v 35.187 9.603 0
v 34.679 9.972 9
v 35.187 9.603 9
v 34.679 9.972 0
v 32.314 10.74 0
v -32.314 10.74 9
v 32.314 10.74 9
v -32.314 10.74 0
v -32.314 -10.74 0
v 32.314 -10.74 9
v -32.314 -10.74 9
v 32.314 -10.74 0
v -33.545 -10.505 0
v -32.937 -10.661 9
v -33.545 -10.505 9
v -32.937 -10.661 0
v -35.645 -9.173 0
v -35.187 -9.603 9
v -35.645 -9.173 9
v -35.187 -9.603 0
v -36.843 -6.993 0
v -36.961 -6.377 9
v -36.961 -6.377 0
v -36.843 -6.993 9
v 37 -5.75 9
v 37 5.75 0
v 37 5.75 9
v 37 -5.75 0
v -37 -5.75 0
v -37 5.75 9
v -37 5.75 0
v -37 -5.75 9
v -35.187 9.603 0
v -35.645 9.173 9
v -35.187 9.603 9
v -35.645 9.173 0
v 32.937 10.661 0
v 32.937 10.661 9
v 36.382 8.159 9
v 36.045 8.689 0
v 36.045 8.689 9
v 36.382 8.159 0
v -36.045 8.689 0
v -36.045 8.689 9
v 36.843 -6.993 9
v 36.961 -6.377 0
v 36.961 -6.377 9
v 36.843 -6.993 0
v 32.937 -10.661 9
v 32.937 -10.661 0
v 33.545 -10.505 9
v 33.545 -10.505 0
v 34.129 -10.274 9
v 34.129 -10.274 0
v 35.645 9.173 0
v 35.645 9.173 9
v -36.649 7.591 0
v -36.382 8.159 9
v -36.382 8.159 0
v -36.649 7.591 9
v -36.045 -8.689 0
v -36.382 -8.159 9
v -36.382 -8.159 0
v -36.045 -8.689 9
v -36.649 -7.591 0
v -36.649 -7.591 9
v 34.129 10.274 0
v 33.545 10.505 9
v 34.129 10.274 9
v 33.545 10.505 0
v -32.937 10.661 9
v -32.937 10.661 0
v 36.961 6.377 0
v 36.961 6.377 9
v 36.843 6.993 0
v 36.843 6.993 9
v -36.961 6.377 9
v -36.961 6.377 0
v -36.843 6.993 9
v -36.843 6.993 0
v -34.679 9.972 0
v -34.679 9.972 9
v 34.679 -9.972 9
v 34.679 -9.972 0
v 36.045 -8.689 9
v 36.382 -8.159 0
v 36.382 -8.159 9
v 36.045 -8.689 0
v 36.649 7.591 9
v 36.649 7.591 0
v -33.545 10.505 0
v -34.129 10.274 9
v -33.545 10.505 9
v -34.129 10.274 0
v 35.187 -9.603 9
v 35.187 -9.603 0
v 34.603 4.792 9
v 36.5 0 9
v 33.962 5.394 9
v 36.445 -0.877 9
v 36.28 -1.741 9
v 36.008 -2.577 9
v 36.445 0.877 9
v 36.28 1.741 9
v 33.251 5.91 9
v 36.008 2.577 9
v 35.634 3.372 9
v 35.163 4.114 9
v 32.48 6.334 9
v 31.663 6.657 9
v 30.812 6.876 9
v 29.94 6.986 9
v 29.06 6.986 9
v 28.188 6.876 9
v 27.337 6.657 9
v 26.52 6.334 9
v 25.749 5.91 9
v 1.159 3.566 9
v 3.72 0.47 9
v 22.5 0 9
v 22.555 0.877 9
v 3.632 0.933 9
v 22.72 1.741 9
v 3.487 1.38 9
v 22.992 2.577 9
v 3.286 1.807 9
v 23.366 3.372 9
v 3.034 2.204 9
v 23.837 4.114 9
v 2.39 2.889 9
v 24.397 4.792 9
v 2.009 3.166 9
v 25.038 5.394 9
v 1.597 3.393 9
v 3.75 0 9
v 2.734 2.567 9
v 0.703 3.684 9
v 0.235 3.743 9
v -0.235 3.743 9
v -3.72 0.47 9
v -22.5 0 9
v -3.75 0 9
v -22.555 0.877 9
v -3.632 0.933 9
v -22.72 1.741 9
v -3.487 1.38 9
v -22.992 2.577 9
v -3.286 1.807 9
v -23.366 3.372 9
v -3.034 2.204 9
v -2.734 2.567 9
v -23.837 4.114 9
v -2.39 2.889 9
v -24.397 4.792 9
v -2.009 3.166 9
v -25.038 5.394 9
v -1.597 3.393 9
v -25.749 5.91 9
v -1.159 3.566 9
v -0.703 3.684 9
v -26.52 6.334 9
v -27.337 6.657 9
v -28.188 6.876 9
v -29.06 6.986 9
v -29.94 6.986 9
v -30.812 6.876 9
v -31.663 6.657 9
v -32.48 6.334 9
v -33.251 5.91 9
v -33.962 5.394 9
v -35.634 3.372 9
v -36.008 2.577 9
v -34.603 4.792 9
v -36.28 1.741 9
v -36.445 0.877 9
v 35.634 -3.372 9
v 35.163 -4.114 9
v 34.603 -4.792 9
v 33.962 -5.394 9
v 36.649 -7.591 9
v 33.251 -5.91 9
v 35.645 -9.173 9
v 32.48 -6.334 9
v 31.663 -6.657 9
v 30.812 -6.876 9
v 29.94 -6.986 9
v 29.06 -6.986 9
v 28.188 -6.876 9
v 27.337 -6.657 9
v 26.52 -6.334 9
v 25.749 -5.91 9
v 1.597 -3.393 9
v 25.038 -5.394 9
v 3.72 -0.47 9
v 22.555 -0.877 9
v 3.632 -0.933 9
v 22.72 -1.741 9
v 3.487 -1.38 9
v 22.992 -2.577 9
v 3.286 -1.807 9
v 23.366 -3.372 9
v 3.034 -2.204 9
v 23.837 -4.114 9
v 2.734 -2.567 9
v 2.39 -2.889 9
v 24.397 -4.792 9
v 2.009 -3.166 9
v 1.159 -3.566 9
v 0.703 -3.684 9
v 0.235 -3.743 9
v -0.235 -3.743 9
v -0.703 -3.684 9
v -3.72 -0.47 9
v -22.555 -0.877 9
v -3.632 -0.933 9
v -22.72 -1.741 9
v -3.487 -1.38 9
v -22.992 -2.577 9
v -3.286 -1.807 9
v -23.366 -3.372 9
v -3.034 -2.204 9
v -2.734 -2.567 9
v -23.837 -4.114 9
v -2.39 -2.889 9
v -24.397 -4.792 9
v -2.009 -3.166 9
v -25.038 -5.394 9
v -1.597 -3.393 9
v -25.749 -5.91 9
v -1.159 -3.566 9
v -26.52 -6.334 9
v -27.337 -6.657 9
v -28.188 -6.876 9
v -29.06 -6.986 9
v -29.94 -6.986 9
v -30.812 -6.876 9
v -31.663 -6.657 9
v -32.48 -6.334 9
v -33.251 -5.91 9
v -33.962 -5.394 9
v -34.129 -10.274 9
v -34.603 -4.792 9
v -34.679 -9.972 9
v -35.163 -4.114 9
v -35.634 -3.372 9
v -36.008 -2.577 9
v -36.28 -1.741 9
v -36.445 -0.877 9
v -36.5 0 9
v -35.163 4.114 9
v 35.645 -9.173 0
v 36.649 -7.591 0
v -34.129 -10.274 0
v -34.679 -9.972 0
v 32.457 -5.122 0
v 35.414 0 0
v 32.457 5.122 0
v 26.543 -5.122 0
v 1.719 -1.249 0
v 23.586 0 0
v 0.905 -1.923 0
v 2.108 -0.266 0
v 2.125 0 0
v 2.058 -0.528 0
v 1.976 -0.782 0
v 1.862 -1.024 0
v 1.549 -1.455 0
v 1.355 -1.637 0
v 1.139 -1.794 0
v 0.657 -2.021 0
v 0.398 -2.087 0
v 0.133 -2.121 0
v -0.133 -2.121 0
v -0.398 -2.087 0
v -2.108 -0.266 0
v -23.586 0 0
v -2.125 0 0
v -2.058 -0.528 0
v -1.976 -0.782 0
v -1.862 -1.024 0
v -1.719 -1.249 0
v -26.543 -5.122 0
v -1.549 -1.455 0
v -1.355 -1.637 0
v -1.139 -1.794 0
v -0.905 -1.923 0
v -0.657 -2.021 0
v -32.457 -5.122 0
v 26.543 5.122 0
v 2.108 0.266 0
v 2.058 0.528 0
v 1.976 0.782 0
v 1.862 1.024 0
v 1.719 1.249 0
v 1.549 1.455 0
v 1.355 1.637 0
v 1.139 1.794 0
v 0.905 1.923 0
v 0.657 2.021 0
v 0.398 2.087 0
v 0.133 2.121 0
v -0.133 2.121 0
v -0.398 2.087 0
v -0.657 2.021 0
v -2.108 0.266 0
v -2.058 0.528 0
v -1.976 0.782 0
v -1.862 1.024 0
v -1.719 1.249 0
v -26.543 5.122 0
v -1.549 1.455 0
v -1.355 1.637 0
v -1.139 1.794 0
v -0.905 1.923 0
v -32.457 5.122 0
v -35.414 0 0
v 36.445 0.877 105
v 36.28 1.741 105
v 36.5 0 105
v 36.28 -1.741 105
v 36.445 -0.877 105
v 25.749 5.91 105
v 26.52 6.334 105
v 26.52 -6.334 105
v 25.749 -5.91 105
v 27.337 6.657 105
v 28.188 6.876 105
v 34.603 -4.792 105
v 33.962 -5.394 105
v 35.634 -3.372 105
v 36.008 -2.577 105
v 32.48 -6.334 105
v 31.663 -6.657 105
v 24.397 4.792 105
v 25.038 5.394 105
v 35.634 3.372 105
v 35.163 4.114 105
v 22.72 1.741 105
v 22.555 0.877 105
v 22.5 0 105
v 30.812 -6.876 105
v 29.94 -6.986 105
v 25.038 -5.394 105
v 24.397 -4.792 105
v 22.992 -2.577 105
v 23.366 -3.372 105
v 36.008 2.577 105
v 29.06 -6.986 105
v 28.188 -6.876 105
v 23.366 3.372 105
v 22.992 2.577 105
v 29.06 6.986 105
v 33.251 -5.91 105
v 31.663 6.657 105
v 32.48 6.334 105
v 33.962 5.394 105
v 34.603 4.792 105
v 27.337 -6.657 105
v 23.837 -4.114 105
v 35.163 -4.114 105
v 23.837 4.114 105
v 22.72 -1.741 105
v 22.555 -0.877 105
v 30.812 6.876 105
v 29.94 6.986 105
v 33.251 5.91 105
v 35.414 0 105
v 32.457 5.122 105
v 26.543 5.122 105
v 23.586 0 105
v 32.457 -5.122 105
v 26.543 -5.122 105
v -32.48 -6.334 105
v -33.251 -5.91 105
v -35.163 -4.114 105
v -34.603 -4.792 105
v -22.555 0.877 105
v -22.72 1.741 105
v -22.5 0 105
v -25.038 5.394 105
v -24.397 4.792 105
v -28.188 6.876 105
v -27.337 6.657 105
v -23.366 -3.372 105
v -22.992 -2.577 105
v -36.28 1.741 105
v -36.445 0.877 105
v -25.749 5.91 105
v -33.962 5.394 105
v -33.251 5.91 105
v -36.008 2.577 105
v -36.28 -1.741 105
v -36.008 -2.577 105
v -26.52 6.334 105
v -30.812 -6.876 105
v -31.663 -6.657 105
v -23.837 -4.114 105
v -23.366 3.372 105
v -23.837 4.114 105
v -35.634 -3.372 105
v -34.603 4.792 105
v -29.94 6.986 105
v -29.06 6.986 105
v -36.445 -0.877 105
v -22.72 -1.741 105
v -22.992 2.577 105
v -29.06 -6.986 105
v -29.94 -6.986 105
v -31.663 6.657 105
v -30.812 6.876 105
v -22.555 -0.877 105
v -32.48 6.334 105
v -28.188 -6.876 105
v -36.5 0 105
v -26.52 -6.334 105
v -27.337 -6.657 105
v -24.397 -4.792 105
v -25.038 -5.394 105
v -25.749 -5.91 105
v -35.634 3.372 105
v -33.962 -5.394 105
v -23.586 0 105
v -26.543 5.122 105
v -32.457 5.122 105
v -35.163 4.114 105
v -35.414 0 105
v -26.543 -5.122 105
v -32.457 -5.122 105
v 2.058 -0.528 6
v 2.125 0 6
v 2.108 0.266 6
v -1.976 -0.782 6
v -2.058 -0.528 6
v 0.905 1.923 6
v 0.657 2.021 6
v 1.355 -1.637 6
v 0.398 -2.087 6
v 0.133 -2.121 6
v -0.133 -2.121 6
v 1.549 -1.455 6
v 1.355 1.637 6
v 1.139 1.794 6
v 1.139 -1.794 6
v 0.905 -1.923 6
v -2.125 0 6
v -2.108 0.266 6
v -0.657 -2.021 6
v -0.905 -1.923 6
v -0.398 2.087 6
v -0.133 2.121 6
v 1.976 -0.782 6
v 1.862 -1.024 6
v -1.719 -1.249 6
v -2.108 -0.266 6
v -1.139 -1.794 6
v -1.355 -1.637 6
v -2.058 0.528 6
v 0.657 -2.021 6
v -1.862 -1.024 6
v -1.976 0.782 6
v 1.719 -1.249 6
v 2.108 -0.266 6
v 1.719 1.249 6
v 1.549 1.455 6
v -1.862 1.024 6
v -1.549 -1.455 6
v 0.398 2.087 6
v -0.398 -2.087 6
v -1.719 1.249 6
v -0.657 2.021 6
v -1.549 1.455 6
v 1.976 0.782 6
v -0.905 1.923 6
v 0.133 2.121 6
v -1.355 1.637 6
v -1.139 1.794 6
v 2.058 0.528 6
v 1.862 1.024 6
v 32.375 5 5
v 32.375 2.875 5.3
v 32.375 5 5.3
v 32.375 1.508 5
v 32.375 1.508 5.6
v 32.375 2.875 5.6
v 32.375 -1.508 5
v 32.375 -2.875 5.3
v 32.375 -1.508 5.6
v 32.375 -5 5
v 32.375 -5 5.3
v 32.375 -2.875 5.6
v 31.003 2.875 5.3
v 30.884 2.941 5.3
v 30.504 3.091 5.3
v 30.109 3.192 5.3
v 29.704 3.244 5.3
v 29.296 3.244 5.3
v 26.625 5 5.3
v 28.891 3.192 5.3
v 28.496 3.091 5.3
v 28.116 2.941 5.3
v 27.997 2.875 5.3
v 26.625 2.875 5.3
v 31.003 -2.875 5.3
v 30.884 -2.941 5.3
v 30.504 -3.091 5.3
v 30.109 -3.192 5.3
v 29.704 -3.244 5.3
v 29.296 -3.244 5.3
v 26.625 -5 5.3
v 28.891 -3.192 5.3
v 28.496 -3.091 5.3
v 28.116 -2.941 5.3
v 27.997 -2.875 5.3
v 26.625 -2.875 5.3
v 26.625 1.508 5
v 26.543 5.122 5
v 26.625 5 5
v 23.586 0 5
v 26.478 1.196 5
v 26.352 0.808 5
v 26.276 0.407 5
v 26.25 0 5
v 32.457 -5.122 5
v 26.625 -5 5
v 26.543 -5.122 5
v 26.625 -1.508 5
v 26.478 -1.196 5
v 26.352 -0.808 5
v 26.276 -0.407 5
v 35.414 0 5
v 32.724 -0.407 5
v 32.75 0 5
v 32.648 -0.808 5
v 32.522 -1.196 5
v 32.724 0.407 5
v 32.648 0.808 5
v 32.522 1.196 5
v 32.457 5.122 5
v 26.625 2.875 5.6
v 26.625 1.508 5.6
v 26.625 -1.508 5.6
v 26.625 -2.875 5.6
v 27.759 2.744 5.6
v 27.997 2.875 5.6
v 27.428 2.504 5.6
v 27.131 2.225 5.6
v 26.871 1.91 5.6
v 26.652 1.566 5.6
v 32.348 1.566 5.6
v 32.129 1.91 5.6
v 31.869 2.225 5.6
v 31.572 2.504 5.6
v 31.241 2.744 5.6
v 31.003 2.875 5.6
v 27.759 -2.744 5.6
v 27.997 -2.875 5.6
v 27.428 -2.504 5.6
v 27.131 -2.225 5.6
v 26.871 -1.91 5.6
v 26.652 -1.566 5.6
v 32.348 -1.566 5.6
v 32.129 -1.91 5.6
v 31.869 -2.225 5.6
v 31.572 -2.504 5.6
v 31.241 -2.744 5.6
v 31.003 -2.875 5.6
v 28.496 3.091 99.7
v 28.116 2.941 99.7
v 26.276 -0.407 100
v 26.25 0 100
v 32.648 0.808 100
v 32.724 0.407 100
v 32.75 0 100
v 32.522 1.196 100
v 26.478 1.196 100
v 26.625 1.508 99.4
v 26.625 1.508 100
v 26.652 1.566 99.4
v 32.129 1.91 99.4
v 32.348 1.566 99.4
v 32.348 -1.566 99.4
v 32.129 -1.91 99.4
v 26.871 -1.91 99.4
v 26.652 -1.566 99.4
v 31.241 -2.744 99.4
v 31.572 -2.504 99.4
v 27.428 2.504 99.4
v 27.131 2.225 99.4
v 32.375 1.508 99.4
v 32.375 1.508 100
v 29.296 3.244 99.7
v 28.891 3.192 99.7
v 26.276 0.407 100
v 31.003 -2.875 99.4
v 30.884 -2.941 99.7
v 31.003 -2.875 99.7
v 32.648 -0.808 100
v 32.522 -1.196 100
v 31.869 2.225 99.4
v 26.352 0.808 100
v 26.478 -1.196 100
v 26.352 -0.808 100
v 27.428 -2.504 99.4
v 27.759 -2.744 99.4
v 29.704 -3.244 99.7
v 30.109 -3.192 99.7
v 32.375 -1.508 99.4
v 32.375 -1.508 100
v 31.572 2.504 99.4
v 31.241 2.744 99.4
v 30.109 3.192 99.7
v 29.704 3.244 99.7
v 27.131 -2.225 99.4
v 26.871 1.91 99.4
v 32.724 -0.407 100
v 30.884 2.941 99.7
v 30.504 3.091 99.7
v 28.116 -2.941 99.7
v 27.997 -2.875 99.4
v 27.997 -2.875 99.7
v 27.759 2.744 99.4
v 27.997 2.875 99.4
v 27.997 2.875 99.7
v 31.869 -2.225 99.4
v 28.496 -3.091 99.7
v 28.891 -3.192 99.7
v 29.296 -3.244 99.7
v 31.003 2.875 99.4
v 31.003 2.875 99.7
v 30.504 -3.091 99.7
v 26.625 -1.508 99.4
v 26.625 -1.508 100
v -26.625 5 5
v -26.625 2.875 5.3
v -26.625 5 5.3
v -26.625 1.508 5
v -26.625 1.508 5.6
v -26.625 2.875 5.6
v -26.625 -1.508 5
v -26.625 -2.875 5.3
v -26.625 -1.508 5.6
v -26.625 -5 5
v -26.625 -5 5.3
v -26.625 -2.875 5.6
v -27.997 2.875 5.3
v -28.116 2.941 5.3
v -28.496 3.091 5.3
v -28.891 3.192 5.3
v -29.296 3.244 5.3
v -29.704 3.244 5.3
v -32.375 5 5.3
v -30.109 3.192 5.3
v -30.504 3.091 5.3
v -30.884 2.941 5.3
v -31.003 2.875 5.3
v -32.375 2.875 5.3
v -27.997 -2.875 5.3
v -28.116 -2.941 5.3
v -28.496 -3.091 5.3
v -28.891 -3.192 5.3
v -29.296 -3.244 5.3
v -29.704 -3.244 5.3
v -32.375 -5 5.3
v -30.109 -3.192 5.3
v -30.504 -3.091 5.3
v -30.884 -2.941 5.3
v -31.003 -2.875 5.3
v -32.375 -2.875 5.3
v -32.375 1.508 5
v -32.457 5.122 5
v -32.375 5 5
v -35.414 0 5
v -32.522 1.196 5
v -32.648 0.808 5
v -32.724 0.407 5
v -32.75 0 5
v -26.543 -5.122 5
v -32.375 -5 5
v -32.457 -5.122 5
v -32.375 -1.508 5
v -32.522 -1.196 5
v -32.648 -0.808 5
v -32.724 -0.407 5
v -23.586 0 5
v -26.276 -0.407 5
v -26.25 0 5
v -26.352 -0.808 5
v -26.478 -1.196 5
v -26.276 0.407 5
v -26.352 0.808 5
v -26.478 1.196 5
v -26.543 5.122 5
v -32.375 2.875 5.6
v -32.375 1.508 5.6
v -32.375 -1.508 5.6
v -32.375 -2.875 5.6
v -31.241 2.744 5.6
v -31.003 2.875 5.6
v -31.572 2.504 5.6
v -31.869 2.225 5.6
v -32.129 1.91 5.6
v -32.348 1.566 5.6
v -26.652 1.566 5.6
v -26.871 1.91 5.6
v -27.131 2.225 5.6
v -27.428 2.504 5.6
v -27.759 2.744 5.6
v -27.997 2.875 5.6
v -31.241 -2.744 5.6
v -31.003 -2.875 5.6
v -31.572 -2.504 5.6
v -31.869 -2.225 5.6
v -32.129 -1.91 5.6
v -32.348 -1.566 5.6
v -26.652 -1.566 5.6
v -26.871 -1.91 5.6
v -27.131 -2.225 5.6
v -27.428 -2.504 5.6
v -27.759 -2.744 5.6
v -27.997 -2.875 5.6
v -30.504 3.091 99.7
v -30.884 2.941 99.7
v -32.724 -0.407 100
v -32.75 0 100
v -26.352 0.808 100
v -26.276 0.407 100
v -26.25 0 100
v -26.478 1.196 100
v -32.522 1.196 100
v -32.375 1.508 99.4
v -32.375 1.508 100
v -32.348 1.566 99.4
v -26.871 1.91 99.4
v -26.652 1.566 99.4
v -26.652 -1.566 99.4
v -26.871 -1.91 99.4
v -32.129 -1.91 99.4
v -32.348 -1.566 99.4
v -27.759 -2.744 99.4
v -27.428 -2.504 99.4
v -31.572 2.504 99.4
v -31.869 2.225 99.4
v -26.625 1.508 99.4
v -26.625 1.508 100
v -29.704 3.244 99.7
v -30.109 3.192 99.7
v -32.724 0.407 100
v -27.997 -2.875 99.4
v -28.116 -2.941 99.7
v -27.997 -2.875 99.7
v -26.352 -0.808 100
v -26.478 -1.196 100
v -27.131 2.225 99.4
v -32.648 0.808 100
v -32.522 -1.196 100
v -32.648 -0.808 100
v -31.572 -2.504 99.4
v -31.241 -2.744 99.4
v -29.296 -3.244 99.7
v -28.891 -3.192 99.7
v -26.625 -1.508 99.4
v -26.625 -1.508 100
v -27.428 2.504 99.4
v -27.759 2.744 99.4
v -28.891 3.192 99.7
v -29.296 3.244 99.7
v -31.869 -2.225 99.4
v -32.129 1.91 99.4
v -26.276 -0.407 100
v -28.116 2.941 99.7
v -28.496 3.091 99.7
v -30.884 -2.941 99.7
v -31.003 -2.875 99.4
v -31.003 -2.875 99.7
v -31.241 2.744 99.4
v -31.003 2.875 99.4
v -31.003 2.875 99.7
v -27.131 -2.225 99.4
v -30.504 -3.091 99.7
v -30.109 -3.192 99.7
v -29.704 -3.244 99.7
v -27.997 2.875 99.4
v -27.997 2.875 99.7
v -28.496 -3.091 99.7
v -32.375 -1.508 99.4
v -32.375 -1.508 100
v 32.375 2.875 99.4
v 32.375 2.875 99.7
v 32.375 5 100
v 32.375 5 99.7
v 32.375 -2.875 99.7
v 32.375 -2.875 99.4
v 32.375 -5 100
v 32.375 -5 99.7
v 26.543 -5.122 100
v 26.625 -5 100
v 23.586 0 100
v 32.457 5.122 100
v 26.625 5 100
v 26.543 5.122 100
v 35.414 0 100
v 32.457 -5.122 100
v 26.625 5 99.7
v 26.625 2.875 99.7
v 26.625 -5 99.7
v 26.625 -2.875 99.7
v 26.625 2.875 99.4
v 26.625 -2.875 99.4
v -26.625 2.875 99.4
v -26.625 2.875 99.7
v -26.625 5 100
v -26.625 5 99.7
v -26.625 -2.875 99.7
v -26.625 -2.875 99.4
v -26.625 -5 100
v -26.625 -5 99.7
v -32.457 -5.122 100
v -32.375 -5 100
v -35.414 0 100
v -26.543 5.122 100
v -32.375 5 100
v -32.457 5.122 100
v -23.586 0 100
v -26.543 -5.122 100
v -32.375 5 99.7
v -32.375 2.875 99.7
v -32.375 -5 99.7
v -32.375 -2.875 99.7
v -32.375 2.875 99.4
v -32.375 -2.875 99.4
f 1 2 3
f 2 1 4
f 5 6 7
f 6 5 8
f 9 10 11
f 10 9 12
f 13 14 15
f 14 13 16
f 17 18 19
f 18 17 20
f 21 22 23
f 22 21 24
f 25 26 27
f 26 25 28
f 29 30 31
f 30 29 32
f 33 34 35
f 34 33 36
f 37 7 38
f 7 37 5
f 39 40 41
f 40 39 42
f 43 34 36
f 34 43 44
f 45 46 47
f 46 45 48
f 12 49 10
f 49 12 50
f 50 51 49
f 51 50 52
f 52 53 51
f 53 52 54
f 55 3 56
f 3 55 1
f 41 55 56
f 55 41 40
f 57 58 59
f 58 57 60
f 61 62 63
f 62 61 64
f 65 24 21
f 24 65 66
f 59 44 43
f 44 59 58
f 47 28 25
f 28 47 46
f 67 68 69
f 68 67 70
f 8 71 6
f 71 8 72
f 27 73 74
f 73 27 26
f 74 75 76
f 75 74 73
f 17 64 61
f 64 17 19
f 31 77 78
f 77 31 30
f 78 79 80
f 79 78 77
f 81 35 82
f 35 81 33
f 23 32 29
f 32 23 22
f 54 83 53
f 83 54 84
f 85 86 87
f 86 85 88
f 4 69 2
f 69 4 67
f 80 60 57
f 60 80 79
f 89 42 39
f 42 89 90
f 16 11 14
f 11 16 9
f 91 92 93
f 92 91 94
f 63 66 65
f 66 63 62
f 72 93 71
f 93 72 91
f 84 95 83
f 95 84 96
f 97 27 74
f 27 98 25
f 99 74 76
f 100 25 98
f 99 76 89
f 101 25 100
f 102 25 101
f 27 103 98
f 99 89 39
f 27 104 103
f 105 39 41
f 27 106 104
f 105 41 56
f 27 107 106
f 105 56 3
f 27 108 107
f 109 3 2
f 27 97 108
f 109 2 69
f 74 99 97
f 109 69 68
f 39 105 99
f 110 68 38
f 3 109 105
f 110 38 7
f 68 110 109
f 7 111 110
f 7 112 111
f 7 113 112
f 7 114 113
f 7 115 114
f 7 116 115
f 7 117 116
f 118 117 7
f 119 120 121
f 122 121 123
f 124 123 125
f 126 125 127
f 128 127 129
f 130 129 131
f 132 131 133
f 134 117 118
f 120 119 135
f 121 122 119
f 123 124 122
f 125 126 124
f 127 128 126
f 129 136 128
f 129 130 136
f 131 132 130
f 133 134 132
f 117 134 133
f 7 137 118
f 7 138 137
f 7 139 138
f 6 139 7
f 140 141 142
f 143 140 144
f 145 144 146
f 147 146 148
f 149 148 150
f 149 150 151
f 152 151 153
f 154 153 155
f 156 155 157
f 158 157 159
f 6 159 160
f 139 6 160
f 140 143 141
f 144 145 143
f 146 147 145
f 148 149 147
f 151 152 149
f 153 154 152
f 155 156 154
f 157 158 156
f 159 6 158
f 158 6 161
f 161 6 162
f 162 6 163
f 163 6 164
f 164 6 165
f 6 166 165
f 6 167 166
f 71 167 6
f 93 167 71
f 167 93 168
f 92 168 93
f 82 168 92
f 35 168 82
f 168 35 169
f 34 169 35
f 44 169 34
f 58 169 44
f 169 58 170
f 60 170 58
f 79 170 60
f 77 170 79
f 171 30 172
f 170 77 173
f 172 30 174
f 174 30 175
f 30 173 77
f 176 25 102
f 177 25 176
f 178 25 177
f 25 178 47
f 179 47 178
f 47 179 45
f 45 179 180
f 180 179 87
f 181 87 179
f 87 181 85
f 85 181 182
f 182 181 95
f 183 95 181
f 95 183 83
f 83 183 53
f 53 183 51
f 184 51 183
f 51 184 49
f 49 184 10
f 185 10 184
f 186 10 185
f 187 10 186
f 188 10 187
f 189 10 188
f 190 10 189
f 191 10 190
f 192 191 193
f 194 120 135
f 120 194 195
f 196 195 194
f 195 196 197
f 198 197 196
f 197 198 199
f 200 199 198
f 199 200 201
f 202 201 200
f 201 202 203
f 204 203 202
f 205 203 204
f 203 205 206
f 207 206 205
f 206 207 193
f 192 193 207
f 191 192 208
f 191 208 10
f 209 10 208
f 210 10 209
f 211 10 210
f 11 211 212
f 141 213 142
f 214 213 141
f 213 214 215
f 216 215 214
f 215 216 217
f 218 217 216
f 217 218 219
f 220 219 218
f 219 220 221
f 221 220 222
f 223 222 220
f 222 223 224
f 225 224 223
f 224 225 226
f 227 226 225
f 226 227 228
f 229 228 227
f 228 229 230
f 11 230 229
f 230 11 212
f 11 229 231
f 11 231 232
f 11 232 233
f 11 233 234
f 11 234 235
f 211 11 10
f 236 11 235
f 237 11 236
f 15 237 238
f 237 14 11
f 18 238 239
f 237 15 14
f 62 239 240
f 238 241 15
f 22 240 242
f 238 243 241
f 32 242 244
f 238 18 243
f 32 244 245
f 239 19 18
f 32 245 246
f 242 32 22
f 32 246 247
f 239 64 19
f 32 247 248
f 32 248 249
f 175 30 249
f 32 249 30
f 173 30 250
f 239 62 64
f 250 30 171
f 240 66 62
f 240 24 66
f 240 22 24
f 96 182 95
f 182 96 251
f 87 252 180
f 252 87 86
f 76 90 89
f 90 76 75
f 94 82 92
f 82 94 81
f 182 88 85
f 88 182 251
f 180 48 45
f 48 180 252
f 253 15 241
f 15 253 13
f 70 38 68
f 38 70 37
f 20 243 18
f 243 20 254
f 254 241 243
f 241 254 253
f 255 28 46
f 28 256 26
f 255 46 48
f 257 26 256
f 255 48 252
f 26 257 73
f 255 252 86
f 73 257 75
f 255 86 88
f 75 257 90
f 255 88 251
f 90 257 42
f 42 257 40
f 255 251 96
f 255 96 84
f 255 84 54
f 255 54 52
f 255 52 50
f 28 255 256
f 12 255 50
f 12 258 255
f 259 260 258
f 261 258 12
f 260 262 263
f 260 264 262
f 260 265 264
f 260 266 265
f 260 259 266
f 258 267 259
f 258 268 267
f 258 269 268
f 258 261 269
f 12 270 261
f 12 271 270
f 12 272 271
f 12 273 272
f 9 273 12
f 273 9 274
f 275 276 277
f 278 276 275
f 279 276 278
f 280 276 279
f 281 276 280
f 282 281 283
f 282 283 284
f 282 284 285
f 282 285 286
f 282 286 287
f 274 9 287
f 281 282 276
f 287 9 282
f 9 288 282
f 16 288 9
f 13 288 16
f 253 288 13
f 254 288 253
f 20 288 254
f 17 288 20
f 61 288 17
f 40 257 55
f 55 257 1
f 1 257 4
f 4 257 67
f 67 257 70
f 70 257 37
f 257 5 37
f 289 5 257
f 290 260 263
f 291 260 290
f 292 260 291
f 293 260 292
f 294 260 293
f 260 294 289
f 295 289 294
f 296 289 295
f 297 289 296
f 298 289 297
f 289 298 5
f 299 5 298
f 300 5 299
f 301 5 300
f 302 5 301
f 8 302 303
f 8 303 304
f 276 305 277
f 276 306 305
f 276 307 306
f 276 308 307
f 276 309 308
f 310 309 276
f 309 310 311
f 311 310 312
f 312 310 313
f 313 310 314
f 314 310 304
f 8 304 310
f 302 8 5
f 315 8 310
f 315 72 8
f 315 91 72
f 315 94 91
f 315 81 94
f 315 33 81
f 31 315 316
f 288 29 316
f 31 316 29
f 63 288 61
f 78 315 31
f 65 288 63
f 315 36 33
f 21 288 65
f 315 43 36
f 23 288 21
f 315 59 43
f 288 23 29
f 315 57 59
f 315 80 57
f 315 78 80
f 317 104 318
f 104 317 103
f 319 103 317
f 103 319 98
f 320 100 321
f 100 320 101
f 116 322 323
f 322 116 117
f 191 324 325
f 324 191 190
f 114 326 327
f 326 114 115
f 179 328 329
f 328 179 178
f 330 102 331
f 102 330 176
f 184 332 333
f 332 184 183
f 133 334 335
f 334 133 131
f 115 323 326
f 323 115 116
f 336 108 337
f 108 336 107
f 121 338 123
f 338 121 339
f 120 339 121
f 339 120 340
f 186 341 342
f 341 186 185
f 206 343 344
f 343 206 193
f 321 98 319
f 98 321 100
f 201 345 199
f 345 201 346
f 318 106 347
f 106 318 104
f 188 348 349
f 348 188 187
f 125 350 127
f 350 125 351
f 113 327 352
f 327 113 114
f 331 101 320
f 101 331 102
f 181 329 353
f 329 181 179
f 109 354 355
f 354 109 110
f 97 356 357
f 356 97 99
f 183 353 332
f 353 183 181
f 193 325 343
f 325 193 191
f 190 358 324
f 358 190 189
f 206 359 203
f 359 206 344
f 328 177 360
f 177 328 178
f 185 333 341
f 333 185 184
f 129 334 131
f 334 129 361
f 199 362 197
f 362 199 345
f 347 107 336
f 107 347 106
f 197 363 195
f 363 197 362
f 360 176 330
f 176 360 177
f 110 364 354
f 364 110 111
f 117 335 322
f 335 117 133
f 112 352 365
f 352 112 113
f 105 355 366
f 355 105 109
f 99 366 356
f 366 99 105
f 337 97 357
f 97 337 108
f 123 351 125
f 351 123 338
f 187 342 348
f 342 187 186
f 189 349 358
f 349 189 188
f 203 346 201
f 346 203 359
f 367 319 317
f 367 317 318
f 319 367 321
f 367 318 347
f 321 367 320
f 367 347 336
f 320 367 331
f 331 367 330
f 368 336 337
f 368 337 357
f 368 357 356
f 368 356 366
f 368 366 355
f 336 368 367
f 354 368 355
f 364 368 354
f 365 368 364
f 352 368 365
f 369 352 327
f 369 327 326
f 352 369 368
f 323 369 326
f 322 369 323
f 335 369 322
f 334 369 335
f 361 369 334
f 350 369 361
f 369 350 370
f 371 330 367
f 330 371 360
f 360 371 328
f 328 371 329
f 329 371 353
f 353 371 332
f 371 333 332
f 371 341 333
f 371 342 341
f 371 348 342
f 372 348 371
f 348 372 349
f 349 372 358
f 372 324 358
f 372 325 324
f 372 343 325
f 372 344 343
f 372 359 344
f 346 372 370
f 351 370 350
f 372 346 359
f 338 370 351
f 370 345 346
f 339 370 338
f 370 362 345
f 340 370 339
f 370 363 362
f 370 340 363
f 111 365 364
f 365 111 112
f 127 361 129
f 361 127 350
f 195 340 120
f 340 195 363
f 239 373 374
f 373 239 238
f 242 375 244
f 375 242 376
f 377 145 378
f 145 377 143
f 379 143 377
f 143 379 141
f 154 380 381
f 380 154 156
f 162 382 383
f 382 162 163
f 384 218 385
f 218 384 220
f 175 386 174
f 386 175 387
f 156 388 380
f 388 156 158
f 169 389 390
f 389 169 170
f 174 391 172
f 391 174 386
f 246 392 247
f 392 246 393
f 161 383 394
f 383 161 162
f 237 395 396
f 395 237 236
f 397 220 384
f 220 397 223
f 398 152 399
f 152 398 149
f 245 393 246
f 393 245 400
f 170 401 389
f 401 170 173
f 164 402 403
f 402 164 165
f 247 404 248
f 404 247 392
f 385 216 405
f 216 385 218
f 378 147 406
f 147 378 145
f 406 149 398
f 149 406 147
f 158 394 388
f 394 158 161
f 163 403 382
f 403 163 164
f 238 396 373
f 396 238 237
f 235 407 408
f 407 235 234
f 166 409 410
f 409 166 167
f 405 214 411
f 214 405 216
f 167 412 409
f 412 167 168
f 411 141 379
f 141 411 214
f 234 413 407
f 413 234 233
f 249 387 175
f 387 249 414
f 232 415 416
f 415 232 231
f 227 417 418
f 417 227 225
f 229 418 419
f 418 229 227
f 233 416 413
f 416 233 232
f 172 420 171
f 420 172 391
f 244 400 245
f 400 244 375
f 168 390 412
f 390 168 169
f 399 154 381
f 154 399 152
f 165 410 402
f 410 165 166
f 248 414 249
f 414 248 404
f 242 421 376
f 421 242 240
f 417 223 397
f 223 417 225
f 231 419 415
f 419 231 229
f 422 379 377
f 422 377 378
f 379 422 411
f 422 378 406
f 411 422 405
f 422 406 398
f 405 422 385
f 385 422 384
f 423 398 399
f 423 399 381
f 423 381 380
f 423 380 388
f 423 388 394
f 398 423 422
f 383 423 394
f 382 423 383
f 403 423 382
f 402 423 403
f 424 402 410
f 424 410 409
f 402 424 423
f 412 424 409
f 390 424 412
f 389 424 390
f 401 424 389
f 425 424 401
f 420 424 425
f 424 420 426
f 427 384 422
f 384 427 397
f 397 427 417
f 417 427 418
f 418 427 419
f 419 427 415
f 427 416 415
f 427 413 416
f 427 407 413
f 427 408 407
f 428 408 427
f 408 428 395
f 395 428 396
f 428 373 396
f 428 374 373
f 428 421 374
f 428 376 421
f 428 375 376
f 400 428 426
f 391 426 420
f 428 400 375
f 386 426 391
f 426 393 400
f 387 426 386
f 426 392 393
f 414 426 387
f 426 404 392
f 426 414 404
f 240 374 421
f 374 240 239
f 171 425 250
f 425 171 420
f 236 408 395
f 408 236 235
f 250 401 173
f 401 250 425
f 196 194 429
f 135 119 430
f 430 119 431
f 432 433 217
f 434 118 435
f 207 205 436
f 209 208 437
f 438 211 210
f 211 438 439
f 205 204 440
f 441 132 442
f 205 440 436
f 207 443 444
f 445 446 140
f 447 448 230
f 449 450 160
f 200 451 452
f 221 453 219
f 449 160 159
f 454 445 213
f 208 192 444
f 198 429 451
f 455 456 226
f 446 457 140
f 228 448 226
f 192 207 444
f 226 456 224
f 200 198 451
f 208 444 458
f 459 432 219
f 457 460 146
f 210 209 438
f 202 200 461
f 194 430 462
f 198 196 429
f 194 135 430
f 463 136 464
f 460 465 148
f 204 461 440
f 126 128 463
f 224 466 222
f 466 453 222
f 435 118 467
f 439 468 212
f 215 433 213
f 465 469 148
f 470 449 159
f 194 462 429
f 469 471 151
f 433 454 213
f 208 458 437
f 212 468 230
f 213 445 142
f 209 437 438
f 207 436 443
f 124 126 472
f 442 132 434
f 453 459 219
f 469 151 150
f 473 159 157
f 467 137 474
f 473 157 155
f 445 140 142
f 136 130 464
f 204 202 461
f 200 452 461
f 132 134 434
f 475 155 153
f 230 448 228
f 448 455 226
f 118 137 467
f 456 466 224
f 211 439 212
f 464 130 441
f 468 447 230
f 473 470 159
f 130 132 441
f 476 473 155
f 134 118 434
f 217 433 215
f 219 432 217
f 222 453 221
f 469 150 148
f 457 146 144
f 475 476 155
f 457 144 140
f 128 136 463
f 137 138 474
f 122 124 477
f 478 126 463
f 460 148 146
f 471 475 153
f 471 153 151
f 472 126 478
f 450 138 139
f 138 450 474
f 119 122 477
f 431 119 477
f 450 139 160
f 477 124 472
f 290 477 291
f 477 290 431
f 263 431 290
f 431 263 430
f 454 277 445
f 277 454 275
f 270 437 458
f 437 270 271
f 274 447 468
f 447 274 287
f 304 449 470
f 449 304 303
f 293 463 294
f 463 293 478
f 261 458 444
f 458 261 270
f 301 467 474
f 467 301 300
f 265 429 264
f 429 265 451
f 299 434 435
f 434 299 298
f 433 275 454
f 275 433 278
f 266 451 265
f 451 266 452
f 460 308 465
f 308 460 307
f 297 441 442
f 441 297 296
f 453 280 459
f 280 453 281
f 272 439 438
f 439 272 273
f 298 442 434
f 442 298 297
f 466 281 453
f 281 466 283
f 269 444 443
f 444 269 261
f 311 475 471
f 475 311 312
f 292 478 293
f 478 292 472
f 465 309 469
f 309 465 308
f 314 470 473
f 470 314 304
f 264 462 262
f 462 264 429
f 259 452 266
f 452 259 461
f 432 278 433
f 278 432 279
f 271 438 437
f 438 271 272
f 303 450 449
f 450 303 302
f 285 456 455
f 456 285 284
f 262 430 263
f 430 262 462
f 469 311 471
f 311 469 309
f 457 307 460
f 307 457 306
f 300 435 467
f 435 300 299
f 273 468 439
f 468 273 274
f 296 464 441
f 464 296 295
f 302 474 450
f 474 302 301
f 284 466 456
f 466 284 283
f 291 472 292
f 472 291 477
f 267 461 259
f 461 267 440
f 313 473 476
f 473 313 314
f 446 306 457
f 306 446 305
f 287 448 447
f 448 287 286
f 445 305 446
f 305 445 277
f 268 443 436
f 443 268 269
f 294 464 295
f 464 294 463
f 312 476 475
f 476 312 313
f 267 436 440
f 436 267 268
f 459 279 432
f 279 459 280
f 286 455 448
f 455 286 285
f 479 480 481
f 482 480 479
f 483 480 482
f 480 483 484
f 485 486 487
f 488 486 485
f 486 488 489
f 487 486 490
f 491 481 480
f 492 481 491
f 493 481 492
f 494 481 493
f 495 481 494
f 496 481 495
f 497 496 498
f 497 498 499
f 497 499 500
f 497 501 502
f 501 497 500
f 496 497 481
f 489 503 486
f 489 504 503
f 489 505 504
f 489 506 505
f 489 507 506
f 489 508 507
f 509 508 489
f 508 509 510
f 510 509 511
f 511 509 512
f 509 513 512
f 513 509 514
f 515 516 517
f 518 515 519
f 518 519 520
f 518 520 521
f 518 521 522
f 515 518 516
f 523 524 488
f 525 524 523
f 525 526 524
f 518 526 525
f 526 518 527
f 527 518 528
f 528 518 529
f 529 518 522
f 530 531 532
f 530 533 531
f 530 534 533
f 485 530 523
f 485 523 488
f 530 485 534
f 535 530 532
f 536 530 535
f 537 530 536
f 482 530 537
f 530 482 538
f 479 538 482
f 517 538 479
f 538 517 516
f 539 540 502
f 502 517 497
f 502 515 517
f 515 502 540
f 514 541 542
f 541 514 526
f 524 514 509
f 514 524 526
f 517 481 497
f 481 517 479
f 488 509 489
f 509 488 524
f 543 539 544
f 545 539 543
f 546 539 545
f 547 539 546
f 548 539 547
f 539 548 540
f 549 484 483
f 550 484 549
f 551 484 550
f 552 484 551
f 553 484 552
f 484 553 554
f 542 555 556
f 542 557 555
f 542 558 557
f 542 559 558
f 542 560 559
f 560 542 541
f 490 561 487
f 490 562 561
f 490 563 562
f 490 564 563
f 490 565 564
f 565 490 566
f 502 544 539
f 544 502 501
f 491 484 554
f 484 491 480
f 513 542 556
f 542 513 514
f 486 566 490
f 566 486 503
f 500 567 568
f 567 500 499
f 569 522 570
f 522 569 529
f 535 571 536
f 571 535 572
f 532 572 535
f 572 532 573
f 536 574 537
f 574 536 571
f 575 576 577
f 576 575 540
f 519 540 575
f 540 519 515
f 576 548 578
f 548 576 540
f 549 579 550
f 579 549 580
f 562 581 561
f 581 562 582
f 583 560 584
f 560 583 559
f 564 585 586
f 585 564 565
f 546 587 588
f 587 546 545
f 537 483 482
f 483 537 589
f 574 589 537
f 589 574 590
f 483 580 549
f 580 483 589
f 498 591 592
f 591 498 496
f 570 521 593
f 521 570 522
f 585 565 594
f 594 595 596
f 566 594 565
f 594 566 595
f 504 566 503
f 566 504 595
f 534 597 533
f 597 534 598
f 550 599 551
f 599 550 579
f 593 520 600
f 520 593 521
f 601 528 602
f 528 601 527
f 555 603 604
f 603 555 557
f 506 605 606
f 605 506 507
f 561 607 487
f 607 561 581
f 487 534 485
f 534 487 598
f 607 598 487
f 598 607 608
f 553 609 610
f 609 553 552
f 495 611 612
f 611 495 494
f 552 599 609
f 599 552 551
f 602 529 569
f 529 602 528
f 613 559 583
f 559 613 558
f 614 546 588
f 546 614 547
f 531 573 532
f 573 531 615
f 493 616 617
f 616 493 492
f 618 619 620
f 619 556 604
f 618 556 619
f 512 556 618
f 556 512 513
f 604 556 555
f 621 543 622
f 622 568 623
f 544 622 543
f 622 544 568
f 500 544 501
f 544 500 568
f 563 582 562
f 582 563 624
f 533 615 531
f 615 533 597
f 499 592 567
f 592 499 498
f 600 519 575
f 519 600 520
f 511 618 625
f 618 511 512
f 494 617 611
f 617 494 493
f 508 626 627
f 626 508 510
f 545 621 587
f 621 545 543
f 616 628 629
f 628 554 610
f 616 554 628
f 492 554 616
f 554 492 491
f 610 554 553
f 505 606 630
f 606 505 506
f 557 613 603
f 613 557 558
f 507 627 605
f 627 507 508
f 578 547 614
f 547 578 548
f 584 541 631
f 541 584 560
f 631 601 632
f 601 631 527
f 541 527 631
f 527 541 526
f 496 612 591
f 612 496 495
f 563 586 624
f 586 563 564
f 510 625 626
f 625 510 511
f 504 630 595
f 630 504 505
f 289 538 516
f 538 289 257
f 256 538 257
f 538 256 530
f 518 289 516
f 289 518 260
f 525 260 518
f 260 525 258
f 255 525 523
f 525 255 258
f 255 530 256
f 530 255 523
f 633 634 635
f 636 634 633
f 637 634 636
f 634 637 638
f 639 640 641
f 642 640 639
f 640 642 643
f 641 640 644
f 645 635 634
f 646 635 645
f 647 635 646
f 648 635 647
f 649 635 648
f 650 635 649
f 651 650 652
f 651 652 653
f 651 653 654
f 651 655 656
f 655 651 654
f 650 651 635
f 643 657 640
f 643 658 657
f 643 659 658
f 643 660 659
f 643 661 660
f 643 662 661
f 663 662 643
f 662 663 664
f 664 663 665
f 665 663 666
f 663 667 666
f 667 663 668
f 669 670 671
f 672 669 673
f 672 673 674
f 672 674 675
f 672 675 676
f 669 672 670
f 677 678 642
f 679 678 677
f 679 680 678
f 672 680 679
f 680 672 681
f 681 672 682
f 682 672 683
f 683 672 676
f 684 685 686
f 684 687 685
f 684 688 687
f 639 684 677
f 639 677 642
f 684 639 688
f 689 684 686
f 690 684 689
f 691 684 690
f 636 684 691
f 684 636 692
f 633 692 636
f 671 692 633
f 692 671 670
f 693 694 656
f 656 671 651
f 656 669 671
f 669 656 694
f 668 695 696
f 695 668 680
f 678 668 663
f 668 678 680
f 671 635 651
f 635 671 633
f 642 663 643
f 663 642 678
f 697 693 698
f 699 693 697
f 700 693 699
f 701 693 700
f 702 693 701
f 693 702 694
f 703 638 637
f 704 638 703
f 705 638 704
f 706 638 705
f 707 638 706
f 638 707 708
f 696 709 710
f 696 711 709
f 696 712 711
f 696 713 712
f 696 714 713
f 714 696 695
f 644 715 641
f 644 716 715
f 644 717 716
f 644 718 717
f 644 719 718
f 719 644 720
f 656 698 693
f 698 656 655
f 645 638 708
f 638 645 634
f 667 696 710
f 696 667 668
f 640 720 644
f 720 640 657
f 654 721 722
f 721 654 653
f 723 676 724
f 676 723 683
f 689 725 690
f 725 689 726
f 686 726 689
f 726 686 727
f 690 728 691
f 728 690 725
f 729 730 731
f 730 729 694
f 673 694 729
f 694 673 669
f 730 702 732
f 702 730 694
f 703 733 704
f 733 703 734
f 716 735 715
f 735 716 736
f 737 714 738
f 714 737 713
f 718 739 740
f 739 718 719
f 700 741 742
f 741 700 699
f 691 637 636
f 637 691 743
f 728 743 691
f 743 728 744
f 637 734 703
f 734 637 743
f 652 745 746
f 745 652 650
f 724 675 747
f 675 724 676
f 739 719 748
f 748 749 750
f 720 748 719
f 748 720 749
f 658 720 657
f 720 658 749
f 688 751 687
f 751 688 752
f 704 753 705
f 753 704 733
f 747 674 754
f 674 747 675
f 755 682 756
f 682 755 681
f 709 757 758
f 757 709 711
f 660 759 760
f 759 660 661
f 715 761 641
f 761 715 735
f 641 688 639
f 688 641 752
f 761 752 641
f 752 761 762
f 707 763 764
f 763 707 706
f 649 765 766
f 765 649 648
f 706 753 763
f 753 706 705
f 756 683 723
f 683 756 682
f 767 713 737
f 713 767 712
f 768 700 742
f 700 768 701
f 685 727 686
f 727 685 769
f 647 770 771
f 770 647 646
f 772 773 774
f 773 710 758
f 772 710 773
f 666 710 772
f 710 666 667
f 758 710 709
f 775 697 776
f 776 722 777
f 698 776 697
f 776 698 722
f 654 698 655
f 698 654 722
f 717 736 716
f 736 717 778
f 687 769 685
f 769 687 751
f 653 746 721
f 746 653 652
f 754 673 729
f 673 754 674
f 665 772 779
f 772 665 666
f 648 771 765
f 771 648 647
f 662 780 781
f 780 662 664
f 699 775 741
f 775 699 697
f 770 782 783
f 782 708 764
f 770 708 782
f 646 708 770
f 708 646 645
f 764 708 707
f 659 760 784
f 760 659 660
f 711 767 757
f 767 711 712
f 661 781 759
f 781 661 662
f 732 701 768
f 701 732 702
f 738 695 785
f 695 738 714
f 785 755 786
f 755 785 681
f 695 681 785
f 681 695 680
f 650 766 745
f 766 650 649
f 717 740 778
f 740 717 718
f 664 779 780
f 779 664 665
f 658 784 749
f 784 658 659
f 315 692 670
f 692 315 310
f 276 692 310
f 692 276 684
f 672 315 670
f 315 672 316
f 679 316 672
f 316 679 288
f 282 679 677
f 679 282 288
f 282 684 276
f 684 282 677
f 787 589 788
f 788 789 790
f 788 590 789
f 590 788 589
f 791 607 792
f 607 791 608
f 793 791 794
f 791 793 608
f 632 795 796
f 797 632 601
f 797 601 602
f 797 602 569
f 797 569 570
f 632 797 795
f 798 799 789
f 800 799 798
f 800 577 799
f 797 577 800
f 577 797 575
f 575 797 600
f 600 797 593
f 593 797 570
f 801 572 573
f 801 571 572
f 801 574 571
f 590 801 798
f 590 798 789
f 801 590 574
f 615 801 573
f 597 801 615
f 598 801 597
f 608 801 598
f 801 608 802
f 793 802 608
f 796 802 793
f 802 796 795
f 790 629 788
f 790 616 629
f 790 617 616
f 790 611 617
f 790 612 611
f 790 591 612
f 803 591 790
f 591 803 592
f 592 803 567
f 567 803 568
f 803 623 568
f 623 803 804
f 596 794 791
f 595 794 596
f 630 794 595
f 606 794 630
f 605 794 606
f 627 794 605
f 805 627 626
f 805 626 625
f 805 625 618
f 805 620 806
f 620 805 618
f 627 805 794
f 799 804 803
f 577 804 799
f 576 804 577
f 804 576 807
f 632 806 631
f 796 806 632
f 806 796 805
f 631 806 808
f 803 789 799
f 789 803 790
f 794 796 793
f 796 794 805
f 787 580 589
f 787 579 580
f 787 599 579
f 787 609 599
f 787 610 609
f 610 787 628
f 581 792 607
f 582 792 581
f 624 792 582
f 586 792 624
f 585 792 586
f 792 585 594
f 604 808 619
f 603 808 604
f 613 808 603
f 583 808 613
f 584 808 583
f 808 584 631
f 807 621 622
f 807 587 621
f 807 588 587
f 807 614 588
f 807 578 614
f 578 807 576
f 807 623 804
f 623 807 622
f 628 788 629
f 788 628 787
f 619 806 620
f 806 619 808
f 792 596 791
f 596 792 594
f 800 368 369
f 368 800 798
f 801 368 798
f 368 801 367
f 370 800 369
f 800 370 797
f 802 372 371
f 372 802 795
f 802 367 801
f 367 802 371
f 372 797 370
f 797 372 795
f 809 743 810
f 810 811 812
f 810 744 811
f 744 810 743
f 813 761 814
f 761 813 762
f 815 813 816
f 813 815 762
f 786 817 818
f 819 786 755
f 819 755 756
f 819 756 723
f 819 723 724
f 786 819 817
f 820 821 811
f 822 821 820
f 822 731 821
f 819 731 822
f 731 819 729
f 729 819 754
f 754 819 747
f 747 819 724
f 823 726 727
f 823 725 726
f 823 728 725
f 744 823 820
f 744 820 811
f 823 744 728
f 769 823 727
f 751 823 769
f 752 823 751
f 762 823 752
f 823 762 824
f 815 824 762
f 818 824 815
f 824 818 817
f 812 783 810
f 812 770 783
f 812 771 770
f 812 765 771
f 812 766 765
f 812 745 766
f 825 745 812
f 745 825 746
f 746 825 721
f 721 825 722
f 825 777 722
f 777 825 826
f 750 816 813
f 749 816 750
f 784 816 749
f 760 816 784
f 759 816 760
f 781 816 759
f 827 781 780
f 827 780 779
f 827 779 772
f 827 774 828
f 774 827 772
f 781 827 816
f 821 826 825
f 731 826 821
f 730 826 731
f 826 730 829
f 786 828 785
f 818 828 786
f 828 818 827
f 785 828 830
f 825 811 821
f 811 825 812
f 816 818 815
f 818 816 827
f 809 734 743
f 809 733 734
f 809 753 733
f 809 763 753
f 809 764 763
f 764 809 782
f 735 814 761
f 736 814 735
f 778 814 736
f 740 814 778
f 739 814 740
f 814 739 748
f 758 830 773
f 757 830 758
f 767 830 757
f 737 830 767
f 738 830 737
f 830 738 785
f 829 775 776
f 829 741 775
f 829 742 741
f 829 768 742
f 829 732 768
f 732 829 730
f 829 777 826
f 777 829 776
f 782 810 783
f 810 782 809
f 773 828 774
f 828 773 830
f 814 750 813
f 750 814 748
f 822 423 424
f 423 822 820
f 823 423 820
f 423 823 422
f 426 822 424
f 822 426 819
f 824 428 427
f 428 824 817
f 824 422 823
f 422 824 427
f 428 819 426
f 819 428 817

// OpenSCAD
$fn = 50;


difference() {
	union() {
		hull() {
			translate(v = [-32.0000000000, 5.7500000000, 0]) {
				cylinder(h = 9, r = 5);
			}
			translate(v = [32.0000000000, 5.7500000000, 0]) {
				cylinder(h = 9, r = 5);
			}
			translate(v = [-32.0000000000, -5.7500000000, 0]) {
				cylinder(h = 9, r = 5);
			}
			translate(v = [32.0000000000, -5.7500000000, 0]) {
				cylinder(h = 9, r = 5);
			}
		}
		translate(v = [29.5000000000, 0, 0.0000000000]) {
			cylinder(h = 105, r = 7.0000000000);
		}
		translate(v = [-29.5000000000, 0, 0.0000000000]) {
			cylinder(h = 105, r = 7.0000000000);
		}
		translate(v = [29.5000000000, 0, 99.0000000000]) {
			cylinder(h = 6, r = 7.0000000000);
		}
		translate(v = [-29.5000000000, 0, 99.0000000000]) {
			cylinder(h = 6, r = 7.0000000000);
		}
	}
	union() {
		translate(v = [0, 0, 9]) {
			rotate(a = [0, 0, 0]) {
				difference() {
					union() {
						#translate(v = [0, 0, -100.0000000000]) {
							cylinder(h = 100, r = 2.0000000000);
						}
						#translate(v = [0, 0, -3]) {
							cylinder(h = 3, r1 = 2.1250000000, r2 = 3.7500000000);
						}
						#translate(v = [0, 0, -100.0000000000]) {
							cylinder(h = 100, r = 2.1250000000);
						}
						#translate(v = [0, 0, -100.0000000000]) {
							cylinder(h = 100, r = 2.0000000000);
						}
					}
					union();
				}
			}
		}
		translate(v = [29.5000000000, 0, 0]) {
			rotate(a = [0, 0, 0]) {
				difference() {
					union() {
						#translate(v = [-2.8750000000, -5.0000000000, -0.3000000000]) {
							cube(size = [5.7500000000, 10, 0.3000000000]);
						}
						#translate(v = [-2.8750000000, -2.8750000000, -0.6000000000]) {
							cube(size = [5.7500000000, 5.7500000000, 0.3000000000]);
						}
						#translate(v = [-2.8750000000, -5.0000000000, 5]) {
							cube(size = [5.7500000000, 10, 0.3000000000]);
						}
						#translate(v = [-2.8750000000, -2.8750000000, 5.3000000000]) {
							cube(size = [5.7500000000, 5.7500000000, 0.3000000000]);
						}
						#translate(v = [0, 0, -100.0000000000]) {
							cylinder(h = 200, r = 3.2500000000);
						}
						#linear_extrude(height = 5) {
							polygon(points = [[5.9142500000, 0.0000000000], [2.9571250000, 5.1218907443], [-2.9571250000, 5.1218907443], [-5.9142500000, 0.0000000000], [-2.9571250000, -5.1218907443], [2.9571250000, -5.1218907443]]);
						}
						#translate(v = [-2.8750000000, -5.0000000000, -0.3000000000]) {
							cube(size = [5.7500000000, 10, 0.3000000000]);
						}
						#translate(v = [-2.8750000000, -2.8750000000, -0.6000000000]) {
							cube(size = [5.7500000000, 5.7500000000, 0.3000000000]);
						}
						#translate(v = [-2.8750000000, -5.0000000000, 5]) {
							cube(size = [5.7500000000, 10, 0.3000000000]);
						}
						#translate(v = [-2.8750000000, -2.8750000000, 5.3000000000]) {
							cube(size = [5.7500000000, 5.7500000000, 0.3000000000]);
						}
						#translate(v = [0, 0, -100.0000000000]) {
							cylinder(h = 200, r = 3.2500000000);
						}
						#translate(v = [-2.8750000000, -5.0000000000, -0.3000000000]) {
							cube(size = [5.7500000000, 10, 0.3000000000]);
						}
						#translate(v = [-2.8750000000, -2.8750000000, -0.6000000000]) {
							cube(size = [5.7500000000, 5.7500000000, 0.3000000000]);
						}
						#translate(v = [-2.8750000000, -5.0000000000, 5]) {
							cube(size = [5.7500000000, 10, 0.3000000000]);
						}
						#translate(v = [-2.8750000000, -2.8750000000, 5.3000000000]) {
							cube(size = [5.7500000000, 5.7500000000, 0.3000000000]);
						}
						#translate(v = [0, 0, -100.0000000000]) {
							cylinder(h = 200, r = 3.2500000000);
						}
					}
					union();
				}
			}
		}
		translate(v = [-29.5000000000, 0, 0]) {
			rotate(a = [0, 0, 0]) {
				difference() {
					union() {
						#translate(v = [-2.8750000000, -5.0000000000, -0.3000000000]) {
							cube(size = [5.7500000000, 10, 0.3000000000]);
						}
						#translate(v = [-2.8750000000, -2.8750000000, -0.6000000000]) {
							cube(size = [5.7500000000, 5.7500000000, 0.3000000000]);
						}
						#translate(v = [-2.8750000000, -5.0000000000, 5]) {
							cube(size = [5.7500000000, 10, 0.3000000000]);
						}
						#translate(v = [-2.8750000000, -2.8750000000, 5.3000000000]) {
							cube(size = [5.7500000000, 5.7500000000, 0.3000000000]);
						}
						#translate(v = [0, 0, -100.0000000000]) {
							cylinder(h = 200, r = 3.2500000000);
						}
						#linear_extrude(height = 5) {
							polygon(points = [[5.9142500000, 0.0000000000], [2.9571250000, 5.1218907443], [-2.9571250000, 5.1218907443], [-5.9142500000, 0.0000000000], [-2.9571250000, -5.1218907443], [2.9571250000, -5.1218907443]]);
						}
						#translate(v = [-2.8750000000, -5.0000000000, -0.3000000000]) {
							cube(size = [5.7500000000, 10, 0.3000000000]);
						}
						#translate(v = [-2.8750000000, -2.8750000000, -0.6000000000]) {
							cube(size = [5.7500000000, 5.7500000000, 0.3000000000]);
						}
						#translate(v = [-2.8750000000, -5.0000000000, 5]) {
							cube(size = [5.7500000000, 10, 0.3000000000]);
						}
						#translate(v = [-2.8750000000, -2.8750000000, 5.3000000000]) {
							cube(size = [5.7500000000, 5.7500000000, 0.3000000000]);
						}
						#translate(v = [0, 0, -100.0000000000]) {
							cylinder(h = 200, r = 3.2500000000);
						}
						#translate(v = [-2.8750000000, -5.0000000000, -0.3000000000]) {
							cube(size = [5.7500000000, 10, 0.3000000000]);
						}
						#translate(v = [-2.8750000000, -2.8750000000, -0.6000000000]) {
							cube(size = [5.7500000000, 5.7500000000, 0.3000000000]);
						}
						#translate(v = [-2.8750000000, -5.0000000000, 5]) {
							cube(size = [5.7500000000, 10, 0.3000000000]);
						}
						#translate(v = [-2.8750000000, -2.8750000000, 5.3000000000]) {
							cube(size = [5.7500000000, 5.7500000000, 0.3000000000]);
						}
						#translate(v = [0, 0, -100.0000000000]) {
							cylinder(h = 200, r = 3.2500000000);
						}
					}
					union();
				}
			}
		}
		translate(v = [29.5000000000, 0, 105]) {
			rotate(a = [0, 0, 0]) {
				difference() {
					union() {
						#translate(v = [-2.8750000000, -5.0000000000, -5.3000000000]) {
							cube(size = [5.7500000000, 10, 0.3000000000]);
						}
						#translate(v = [-2.8750000000, -2.8750000000, -5.6000000000]) {
							cube(size = [5.7500000000, 5.7500000000, 0.3000000000]);
						}
						#translate(v = [-2.8750000000, -5.0000000000, 0]) {
							cube(size = [5.7500000000, 10, 0.3000000000]);
						}
						#translate(v = [-2.8750000000, -2.8750000000, 0.3000000000]) {
							cube(size = [5.7500000000, 5.7500000000, 0.3000000000]);
						}
						#translate(v = [0, 0, -100.0000000000]) {
							cylinder(h = 200, r = 3.2500000000);
						}
						translate(v = [0, 0, -5]) {
							#linear_extrude(height = 5) {
								polygon(points = [[5.9142500000, 0.0000000000], [2.9571250000, 5.1218907443], [-2.9571250000, 5.1218907443], [-5.9142500000, 0.0000000000], [-2.9571250000, -5.1218907443], [2.9571250000, -5.1218907443]]);
							}
						}
						#translate(v = [-2.8750000000, -5.0000000000, -5.3000000000]) {
							cube(size = [5.7500000000, 10, 0.3000000000]);
						}
						#translate(v = [-2.8750000000, -2.8750000000, -5.6000000000]) {
							cube(size = [5.7500000000, 5.7500000000, 0.3000000000]);
						}
						#translate(v = [-2.8750000000, -5.0000000000, 0]) {
							cube(size = [5.7500000000, 10, 0.3000000000]);
						}
						#translate(v = [-2.8750000000, -2.8750000000, 0.3000000000]) {
							cube(size = [5.7500000000, 5.7500000000, 0.3000000000]);
						}
						#translate(v = [0, 0, -100.0000000000]) {
							cylinder(h = 200, r = 3.2500000000);
						}
						#translate(v = [-2.8750000000, -5.0000000000, -5.3000000000]) {
							cube(size = [5.7500000000, 10, 0.3000000000]);
						}
						#translate(v = [-2.8750000000, -2.8750000000, -5.6000000000]) {
							cube(size = [5.7500000000, 5.7500000000, 0.3000000000]);
						}
						#translate(v = [-2.8750000000, -5.0000000000, 0]) {
							cube(size = [5.7500000000, 10, 0.3000000000]);
						}
						#translate(v = [-2.8750000000, -2.8750000000, 0.3000000000]) {
							cube(size = [5.7500000000, 5.7500000000, 0.3000000000]);
						}
						#translate(v = [0, 0, -100.0000000000]) {
							cylinder(h = 200, r = 3.2500000000);
						}
					}
					union();
				}
			}
		}
		translate(v = [-29.5000000000, 0, 105]) {
			rotate(a = [0, 0, 0]) {
				difference() {
					union() {
						#translate(v = [-2.8750000000, -5.0000000000, -5.3000000000]) {
							cube(size = [5.7500000000, 10, 0.3000000000]);
						}
						#translate(v = [-2.8750000000, -2.8750000000, -5.6000000000]) {
							cube(size = [5.7500000000, 5.7500000000, 0.3000000000]);
						}
						#translate(v = [-2.8750000000, -5.0000000000, 0]) {
							cube(size = [5.7500000000, 10, 0.3000000000]);
						}
						#translate(v = [-2.8750000000, -2.8750000000, 0.3000000000]) {
							cube(size = [5.7500000000, 5.7500000000, 0.3000000000]);
						}
						#translate(v = [0, 0, -100.0000000000]) {
							cylinder(h = 200, r = 3.2500000000);
						}
						translate(v = [0, 0, -5]) {
							#linear_extrude(height = 5) {
								polygon(points = [[5.9142500000, 0.0000000000], [2.9571250000, 5.1218907443], [-2.9571250000, 5.1218907443], [-5.9142500000, 0.0000000000], [-2.9571250000, -5.1218907443], [2.9571250000, -5.1218907443]]);
							}
						}
						#translate(v = [-2.8750000000, -5.0000000000, -5.3000000000]) {
							cube(size = [5.7500000000, 10, 0.3000000000]);
						}
						#translate(v = [-2.8750000000, -2.8750000000, -5.6000000000]) {
							cube(size = [5.7500000000, 5.7500000000, 0.3000000000]);
						}
						#translate(v = [-2.8750000000, -5.0000000000, 0]) {
							cube(size = [5.7500000000, 10, 0.3000000000]);
						}
						#translate(v = [-2.8750000000, -2.8750000000, 0.3000000000]) {
							cube(size = [5.7500000000, 5.7500000000, 0.3000000000]);
						}
						#translate(v = [0, 0, -100.0000000000]) {
							cylinder(h = 200, r = 3.2500000000);
						}
						#translate(v = [-2.8750000000, -5.0000000000, -5.3000000000]) {
							cube(size = [5.7500000000, 10, 0.3000000000]);
						}
						#translate(v = [-2.8750000000, -2.8750000000, -5.6000000000]) {
							cube(size = [5.7500000000, 5.7500000000, 0.3000000000]);
						}
						#translate(v = [-2.8750000000, -5.0000000000, 0]) {
							cube(size = [5.7500000000, 10, 0.3000000000]);
						}
						#translate(v = [-2.8750000000, -2.8750000000, 0.3000000000]) {
							cube(size = [5.7500000000, 5.7500000000, 0.3000000000]);
						}
						#translate(v = [0, 0, -100.0000000000]) {
							cylinder(h = 200, r = 3.2500000000);
						}
					}
					union();
				}
			}
		}
	}
}
